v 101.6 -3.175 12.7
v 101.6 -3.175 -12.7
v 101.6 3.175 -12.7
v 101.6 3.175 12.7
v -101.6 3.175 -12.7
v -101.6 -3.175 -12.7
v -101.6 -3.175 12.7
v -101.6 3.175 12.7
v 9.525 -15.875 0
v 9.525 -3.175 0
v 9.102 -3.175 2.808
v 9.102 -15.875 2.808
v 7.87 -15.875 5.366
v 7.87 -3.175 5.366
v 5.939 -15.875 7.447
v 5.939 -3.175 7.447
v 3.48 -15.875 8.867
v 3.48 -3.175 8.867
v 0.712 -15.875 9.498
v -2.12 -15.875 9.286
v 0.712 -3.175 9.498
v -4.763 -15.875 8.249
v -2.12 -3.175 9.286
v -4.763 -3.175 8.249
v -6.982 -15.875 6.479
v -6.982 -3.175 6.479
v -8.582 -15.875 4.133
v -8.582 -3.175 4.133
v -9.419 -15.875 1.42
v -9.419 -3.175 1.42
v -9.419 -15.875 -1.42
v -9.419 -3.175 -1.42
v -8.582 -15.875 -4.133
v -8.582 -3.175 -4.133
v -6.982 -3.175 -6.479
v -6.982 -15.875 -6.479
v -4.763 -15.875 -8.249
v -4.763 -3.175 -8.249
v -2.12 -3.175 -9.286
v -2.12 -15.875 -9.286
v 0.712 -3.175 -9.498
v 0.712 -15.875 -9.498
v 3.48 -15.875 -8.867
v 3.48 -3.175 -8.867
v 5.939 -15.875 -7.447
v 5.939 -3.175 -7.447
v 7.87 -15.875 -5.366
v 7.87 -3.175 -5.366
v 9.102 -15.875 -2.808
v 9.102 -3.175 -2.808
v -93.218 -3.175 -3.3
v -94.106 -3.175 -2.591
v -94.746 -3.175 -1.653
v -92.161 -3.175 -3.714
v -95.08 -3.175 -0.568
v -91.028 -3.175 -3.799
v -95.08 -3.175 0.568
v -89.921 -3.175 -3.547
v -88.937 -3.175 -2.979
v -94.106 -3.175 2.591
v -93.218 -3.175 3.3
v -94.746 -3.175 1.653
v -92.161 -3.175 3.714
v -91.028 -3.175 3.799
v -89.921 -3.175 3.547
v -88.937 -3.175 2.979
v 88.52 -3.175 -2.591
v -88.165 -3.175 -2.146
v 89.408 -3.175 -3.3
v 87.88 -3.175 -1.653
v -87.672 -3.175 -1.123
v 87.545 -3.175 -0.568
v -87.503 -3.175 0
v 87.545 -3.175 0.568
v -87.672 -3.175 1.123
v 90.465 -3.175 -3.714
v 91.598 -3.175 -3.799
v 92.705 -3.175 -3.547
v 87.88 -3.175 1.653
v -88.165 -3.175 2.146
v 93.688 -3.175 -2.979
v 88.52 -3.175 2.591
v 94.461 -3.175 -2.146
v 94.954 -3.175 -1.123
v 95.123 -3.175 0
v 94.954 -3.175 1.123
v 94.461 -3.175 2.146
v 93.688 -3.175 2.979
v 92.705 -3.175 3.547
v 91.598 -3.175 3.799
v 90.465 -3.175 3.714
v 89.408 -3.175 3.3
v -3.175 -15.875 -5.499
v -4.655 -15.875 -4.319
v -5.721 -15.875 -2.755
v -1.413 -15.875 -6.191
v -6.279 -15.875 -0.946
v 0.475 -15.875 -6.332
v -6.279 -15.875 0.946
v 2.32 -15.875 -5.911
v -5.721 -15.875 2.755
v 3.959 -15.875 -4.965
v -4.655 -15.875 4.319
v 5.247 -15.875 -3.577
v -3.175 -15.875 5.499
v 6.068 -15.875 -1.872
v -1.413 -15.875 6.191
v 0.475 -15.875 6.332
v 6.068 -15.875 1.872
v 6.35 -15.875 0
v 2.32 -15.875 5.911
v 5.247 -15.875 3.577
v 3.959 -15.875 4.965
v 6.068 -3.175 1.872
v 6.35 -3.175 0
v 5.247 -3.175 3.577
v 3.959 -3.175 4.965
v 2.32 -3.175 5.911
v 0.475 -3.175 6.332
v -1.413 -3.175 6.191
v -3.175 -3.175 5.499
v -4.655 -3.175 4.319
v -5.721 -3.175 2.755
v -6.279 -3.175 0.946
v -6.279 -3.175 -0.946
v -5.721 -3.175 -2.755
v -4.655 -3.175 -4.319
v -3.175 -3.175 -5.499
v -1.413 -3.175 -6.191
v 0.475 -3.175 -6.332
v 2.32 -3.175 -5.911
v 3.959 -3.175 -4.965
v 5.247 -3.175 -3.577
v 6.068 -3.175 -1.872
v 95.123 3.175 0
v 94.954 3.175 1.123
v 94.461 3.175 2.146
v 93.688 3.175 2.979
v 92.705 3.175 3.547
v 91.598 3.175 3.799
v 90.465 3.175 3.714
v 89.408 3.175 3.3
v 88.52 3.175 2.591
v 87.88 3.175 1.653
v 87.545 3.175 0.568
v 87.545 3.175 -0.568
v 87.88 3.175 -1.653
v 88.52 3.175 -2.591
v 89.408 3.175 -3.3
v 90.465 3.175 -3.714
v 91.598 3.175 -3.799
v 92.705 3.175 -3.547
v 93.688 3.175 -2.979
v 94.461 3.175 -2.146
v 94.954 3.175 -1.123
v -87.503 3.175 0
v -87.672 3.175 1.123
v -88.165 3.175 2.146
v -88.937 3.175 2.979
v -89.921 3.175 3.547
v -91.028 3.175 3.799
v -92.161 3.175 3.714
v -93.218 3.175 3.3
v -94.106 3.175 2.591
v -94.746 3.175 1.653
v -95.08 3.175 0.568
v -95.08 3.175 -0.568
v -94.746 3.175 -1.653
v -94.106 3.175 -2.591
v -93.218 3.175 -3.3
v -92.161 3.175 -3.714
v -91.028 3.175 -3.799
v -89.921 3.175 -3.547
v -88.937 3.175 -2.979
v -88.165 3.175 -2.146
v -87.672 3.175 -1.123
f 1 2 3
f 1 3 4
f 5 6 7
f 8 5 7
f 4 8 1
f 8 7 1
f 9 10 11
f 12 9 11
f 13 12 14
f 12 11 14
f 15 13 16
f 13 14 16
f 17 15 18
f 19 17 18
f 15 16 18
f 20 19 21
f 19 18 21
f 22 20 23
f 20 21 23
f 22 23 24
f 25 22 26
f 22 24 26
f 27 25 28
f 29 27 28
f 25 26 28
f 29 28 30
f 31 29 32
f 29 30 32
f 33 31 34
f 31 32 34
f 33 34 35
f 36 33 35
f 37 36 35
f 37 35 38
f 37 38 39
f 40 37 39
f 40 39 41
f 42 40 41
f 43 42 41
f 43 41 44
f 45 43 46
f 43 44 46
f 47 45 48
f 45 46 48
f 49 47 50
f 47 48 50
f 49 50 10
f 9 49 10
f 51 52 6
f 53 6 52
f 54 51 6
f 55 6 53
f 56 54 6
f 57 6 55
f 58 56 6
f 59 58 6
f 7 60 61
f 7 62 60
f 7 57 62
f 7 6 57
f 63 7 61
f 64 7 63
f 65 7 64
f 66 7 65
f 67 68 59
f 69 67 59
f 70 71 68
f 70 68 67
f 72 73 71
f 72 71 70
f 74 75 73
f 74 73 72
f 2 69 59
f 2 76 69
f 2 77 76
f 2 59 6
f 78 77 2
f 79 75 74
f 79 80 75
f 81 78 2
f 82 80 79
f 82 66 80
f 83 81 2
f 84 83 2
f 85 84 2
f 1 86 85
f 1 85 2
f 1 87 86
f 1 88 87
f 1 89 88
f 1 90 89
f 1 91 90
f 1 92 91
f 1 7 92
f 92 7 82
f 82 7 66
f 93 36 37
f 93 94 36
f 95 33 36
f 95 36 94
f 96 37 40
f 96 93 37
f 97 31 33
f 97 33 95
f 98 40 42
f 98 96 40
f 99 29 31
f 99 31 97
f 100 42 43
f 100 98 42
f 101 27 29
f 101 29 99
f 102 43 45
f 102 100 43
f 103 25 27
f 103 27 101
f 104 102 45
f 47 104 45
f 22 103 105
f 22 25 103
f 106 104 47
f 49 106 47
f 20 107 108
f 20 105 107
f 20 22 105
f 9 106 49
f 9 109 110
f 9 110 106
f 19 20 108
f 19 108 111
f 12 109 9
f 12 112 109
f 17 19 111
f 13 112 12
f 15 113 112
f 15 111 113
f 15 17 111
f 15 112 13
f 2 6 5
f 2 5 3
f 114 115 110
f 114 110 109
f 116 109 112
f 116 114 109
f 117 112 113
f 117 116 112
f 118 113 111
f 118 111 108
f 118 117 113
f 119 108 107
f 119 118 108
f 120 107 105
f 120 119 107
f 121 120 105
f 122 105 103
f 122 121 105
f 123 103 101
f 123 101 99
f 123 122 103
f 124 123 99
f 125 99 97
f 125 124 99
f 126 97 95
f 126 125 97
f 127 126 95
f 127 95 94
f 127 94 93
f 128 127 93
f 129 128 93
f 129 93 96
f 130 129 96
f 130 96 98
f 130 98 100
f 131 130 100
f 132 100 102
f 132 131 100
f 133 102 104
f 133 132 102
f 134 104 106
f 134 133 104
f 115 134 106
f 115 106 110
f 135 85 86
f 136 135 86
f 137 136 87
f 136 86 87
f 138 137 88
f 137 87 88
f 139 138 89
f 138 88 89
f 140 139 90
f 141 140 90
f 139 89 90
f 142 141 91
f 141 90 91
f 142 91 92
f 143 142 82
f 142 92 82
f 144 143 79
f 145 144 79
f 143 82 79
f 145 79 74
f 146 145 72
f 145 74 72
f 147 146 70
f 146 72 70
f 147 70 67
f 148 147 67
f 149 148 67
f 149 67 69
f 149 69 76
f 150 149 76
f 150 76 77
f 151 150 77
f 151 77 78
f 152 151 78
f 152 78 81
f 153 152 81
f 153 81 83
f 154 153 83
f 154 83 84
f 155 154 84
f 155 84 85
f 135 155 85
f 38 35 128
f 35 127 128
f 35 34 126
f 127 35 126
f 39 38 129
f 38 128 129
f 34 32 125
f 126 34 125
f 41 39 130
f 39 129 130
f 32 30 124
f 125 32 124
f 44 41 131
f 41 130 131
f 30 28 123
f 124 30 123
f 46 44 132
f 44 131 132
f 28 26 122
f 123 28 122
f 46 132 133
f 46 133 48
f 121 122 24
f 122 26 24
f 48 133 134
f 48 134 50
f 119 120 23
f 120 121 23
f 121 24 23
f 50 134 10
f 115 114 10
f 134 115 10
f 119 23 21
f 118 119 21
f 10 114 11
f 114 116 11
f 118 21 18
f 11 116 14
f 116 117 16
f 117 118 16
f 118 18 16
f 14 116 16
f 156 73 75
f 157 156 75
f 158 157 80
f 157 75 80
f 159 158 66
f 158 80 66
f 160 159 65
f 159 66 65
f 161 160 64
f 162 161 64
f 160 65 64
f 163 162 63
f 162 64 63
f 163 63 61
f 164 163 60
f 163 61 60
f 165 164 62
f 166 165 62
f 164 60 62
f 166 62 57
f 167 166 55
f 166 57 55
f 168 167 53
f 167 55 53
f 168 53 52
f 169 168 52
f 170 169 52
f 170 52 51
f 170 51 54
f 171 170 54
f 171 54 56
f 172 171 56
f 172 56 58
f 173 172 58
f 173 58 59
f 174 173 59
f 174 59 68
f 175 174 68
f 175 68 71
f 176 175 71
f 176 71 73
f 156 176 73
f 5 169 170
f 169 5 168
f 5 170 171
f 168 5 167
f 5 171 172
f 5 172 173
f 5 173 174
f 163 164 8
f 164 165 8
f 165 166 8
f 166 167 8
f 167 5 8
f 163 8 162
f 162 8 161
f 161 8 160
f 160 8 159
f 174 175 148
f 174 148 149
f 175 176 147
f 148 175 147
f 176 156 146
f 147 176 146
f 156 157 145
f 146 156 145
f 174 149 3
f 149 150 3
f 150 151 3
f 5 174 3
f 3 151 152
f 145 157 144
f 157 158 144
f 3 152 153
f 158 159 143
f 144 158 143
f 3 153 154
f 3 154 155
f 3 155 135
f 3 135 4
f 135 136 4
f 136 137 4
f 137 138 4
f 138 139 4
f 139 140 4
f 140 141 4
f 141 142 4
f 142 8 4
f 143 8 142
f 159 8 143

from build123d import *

# Parameters (mm, degrees)
F0_W     = 203.2
F0_H     = 25.4
F1_DEPTH = 3.175
F2_R     = 9.525
F2_R_2   = 6.35
F3_DEPTH = 12.7
F4_R     = 3.81
F5_DEPTH = 6.351


with BuildPart() as f1:
    # F0 (on Front) → F1 (new body, symmetric)
    with BuildSketch(Plane.XZ):
        Rectangle(F0_W, F0_H)
    extrude(amount=F1_DEPTH, both=True)

    # F4 (on face) → F5 (cut, through all)
    with BuildSketch(Plane.XZ.offset(3.175)):
        with Locations((-91.312926, 0)):
            Circle(F4_R)
        with Locations((91.312926, 0)):
            Circle(F4_R)
    extrude(amount=-F5_DEPTH, mode=Mode.SUBTRACT)


with BuildPart() as f3:
    # F2 (on face) → F3 (new body)
    with BuildSketch(Plane.XZ.offset(3.175)):
        Circle(F2_R)
        Circle(F2_R_2, mode=Mode.SUBTRACT)
    extrude(amount=F3_DEPTH)


solid = Compound([f1.part, f3.part])
